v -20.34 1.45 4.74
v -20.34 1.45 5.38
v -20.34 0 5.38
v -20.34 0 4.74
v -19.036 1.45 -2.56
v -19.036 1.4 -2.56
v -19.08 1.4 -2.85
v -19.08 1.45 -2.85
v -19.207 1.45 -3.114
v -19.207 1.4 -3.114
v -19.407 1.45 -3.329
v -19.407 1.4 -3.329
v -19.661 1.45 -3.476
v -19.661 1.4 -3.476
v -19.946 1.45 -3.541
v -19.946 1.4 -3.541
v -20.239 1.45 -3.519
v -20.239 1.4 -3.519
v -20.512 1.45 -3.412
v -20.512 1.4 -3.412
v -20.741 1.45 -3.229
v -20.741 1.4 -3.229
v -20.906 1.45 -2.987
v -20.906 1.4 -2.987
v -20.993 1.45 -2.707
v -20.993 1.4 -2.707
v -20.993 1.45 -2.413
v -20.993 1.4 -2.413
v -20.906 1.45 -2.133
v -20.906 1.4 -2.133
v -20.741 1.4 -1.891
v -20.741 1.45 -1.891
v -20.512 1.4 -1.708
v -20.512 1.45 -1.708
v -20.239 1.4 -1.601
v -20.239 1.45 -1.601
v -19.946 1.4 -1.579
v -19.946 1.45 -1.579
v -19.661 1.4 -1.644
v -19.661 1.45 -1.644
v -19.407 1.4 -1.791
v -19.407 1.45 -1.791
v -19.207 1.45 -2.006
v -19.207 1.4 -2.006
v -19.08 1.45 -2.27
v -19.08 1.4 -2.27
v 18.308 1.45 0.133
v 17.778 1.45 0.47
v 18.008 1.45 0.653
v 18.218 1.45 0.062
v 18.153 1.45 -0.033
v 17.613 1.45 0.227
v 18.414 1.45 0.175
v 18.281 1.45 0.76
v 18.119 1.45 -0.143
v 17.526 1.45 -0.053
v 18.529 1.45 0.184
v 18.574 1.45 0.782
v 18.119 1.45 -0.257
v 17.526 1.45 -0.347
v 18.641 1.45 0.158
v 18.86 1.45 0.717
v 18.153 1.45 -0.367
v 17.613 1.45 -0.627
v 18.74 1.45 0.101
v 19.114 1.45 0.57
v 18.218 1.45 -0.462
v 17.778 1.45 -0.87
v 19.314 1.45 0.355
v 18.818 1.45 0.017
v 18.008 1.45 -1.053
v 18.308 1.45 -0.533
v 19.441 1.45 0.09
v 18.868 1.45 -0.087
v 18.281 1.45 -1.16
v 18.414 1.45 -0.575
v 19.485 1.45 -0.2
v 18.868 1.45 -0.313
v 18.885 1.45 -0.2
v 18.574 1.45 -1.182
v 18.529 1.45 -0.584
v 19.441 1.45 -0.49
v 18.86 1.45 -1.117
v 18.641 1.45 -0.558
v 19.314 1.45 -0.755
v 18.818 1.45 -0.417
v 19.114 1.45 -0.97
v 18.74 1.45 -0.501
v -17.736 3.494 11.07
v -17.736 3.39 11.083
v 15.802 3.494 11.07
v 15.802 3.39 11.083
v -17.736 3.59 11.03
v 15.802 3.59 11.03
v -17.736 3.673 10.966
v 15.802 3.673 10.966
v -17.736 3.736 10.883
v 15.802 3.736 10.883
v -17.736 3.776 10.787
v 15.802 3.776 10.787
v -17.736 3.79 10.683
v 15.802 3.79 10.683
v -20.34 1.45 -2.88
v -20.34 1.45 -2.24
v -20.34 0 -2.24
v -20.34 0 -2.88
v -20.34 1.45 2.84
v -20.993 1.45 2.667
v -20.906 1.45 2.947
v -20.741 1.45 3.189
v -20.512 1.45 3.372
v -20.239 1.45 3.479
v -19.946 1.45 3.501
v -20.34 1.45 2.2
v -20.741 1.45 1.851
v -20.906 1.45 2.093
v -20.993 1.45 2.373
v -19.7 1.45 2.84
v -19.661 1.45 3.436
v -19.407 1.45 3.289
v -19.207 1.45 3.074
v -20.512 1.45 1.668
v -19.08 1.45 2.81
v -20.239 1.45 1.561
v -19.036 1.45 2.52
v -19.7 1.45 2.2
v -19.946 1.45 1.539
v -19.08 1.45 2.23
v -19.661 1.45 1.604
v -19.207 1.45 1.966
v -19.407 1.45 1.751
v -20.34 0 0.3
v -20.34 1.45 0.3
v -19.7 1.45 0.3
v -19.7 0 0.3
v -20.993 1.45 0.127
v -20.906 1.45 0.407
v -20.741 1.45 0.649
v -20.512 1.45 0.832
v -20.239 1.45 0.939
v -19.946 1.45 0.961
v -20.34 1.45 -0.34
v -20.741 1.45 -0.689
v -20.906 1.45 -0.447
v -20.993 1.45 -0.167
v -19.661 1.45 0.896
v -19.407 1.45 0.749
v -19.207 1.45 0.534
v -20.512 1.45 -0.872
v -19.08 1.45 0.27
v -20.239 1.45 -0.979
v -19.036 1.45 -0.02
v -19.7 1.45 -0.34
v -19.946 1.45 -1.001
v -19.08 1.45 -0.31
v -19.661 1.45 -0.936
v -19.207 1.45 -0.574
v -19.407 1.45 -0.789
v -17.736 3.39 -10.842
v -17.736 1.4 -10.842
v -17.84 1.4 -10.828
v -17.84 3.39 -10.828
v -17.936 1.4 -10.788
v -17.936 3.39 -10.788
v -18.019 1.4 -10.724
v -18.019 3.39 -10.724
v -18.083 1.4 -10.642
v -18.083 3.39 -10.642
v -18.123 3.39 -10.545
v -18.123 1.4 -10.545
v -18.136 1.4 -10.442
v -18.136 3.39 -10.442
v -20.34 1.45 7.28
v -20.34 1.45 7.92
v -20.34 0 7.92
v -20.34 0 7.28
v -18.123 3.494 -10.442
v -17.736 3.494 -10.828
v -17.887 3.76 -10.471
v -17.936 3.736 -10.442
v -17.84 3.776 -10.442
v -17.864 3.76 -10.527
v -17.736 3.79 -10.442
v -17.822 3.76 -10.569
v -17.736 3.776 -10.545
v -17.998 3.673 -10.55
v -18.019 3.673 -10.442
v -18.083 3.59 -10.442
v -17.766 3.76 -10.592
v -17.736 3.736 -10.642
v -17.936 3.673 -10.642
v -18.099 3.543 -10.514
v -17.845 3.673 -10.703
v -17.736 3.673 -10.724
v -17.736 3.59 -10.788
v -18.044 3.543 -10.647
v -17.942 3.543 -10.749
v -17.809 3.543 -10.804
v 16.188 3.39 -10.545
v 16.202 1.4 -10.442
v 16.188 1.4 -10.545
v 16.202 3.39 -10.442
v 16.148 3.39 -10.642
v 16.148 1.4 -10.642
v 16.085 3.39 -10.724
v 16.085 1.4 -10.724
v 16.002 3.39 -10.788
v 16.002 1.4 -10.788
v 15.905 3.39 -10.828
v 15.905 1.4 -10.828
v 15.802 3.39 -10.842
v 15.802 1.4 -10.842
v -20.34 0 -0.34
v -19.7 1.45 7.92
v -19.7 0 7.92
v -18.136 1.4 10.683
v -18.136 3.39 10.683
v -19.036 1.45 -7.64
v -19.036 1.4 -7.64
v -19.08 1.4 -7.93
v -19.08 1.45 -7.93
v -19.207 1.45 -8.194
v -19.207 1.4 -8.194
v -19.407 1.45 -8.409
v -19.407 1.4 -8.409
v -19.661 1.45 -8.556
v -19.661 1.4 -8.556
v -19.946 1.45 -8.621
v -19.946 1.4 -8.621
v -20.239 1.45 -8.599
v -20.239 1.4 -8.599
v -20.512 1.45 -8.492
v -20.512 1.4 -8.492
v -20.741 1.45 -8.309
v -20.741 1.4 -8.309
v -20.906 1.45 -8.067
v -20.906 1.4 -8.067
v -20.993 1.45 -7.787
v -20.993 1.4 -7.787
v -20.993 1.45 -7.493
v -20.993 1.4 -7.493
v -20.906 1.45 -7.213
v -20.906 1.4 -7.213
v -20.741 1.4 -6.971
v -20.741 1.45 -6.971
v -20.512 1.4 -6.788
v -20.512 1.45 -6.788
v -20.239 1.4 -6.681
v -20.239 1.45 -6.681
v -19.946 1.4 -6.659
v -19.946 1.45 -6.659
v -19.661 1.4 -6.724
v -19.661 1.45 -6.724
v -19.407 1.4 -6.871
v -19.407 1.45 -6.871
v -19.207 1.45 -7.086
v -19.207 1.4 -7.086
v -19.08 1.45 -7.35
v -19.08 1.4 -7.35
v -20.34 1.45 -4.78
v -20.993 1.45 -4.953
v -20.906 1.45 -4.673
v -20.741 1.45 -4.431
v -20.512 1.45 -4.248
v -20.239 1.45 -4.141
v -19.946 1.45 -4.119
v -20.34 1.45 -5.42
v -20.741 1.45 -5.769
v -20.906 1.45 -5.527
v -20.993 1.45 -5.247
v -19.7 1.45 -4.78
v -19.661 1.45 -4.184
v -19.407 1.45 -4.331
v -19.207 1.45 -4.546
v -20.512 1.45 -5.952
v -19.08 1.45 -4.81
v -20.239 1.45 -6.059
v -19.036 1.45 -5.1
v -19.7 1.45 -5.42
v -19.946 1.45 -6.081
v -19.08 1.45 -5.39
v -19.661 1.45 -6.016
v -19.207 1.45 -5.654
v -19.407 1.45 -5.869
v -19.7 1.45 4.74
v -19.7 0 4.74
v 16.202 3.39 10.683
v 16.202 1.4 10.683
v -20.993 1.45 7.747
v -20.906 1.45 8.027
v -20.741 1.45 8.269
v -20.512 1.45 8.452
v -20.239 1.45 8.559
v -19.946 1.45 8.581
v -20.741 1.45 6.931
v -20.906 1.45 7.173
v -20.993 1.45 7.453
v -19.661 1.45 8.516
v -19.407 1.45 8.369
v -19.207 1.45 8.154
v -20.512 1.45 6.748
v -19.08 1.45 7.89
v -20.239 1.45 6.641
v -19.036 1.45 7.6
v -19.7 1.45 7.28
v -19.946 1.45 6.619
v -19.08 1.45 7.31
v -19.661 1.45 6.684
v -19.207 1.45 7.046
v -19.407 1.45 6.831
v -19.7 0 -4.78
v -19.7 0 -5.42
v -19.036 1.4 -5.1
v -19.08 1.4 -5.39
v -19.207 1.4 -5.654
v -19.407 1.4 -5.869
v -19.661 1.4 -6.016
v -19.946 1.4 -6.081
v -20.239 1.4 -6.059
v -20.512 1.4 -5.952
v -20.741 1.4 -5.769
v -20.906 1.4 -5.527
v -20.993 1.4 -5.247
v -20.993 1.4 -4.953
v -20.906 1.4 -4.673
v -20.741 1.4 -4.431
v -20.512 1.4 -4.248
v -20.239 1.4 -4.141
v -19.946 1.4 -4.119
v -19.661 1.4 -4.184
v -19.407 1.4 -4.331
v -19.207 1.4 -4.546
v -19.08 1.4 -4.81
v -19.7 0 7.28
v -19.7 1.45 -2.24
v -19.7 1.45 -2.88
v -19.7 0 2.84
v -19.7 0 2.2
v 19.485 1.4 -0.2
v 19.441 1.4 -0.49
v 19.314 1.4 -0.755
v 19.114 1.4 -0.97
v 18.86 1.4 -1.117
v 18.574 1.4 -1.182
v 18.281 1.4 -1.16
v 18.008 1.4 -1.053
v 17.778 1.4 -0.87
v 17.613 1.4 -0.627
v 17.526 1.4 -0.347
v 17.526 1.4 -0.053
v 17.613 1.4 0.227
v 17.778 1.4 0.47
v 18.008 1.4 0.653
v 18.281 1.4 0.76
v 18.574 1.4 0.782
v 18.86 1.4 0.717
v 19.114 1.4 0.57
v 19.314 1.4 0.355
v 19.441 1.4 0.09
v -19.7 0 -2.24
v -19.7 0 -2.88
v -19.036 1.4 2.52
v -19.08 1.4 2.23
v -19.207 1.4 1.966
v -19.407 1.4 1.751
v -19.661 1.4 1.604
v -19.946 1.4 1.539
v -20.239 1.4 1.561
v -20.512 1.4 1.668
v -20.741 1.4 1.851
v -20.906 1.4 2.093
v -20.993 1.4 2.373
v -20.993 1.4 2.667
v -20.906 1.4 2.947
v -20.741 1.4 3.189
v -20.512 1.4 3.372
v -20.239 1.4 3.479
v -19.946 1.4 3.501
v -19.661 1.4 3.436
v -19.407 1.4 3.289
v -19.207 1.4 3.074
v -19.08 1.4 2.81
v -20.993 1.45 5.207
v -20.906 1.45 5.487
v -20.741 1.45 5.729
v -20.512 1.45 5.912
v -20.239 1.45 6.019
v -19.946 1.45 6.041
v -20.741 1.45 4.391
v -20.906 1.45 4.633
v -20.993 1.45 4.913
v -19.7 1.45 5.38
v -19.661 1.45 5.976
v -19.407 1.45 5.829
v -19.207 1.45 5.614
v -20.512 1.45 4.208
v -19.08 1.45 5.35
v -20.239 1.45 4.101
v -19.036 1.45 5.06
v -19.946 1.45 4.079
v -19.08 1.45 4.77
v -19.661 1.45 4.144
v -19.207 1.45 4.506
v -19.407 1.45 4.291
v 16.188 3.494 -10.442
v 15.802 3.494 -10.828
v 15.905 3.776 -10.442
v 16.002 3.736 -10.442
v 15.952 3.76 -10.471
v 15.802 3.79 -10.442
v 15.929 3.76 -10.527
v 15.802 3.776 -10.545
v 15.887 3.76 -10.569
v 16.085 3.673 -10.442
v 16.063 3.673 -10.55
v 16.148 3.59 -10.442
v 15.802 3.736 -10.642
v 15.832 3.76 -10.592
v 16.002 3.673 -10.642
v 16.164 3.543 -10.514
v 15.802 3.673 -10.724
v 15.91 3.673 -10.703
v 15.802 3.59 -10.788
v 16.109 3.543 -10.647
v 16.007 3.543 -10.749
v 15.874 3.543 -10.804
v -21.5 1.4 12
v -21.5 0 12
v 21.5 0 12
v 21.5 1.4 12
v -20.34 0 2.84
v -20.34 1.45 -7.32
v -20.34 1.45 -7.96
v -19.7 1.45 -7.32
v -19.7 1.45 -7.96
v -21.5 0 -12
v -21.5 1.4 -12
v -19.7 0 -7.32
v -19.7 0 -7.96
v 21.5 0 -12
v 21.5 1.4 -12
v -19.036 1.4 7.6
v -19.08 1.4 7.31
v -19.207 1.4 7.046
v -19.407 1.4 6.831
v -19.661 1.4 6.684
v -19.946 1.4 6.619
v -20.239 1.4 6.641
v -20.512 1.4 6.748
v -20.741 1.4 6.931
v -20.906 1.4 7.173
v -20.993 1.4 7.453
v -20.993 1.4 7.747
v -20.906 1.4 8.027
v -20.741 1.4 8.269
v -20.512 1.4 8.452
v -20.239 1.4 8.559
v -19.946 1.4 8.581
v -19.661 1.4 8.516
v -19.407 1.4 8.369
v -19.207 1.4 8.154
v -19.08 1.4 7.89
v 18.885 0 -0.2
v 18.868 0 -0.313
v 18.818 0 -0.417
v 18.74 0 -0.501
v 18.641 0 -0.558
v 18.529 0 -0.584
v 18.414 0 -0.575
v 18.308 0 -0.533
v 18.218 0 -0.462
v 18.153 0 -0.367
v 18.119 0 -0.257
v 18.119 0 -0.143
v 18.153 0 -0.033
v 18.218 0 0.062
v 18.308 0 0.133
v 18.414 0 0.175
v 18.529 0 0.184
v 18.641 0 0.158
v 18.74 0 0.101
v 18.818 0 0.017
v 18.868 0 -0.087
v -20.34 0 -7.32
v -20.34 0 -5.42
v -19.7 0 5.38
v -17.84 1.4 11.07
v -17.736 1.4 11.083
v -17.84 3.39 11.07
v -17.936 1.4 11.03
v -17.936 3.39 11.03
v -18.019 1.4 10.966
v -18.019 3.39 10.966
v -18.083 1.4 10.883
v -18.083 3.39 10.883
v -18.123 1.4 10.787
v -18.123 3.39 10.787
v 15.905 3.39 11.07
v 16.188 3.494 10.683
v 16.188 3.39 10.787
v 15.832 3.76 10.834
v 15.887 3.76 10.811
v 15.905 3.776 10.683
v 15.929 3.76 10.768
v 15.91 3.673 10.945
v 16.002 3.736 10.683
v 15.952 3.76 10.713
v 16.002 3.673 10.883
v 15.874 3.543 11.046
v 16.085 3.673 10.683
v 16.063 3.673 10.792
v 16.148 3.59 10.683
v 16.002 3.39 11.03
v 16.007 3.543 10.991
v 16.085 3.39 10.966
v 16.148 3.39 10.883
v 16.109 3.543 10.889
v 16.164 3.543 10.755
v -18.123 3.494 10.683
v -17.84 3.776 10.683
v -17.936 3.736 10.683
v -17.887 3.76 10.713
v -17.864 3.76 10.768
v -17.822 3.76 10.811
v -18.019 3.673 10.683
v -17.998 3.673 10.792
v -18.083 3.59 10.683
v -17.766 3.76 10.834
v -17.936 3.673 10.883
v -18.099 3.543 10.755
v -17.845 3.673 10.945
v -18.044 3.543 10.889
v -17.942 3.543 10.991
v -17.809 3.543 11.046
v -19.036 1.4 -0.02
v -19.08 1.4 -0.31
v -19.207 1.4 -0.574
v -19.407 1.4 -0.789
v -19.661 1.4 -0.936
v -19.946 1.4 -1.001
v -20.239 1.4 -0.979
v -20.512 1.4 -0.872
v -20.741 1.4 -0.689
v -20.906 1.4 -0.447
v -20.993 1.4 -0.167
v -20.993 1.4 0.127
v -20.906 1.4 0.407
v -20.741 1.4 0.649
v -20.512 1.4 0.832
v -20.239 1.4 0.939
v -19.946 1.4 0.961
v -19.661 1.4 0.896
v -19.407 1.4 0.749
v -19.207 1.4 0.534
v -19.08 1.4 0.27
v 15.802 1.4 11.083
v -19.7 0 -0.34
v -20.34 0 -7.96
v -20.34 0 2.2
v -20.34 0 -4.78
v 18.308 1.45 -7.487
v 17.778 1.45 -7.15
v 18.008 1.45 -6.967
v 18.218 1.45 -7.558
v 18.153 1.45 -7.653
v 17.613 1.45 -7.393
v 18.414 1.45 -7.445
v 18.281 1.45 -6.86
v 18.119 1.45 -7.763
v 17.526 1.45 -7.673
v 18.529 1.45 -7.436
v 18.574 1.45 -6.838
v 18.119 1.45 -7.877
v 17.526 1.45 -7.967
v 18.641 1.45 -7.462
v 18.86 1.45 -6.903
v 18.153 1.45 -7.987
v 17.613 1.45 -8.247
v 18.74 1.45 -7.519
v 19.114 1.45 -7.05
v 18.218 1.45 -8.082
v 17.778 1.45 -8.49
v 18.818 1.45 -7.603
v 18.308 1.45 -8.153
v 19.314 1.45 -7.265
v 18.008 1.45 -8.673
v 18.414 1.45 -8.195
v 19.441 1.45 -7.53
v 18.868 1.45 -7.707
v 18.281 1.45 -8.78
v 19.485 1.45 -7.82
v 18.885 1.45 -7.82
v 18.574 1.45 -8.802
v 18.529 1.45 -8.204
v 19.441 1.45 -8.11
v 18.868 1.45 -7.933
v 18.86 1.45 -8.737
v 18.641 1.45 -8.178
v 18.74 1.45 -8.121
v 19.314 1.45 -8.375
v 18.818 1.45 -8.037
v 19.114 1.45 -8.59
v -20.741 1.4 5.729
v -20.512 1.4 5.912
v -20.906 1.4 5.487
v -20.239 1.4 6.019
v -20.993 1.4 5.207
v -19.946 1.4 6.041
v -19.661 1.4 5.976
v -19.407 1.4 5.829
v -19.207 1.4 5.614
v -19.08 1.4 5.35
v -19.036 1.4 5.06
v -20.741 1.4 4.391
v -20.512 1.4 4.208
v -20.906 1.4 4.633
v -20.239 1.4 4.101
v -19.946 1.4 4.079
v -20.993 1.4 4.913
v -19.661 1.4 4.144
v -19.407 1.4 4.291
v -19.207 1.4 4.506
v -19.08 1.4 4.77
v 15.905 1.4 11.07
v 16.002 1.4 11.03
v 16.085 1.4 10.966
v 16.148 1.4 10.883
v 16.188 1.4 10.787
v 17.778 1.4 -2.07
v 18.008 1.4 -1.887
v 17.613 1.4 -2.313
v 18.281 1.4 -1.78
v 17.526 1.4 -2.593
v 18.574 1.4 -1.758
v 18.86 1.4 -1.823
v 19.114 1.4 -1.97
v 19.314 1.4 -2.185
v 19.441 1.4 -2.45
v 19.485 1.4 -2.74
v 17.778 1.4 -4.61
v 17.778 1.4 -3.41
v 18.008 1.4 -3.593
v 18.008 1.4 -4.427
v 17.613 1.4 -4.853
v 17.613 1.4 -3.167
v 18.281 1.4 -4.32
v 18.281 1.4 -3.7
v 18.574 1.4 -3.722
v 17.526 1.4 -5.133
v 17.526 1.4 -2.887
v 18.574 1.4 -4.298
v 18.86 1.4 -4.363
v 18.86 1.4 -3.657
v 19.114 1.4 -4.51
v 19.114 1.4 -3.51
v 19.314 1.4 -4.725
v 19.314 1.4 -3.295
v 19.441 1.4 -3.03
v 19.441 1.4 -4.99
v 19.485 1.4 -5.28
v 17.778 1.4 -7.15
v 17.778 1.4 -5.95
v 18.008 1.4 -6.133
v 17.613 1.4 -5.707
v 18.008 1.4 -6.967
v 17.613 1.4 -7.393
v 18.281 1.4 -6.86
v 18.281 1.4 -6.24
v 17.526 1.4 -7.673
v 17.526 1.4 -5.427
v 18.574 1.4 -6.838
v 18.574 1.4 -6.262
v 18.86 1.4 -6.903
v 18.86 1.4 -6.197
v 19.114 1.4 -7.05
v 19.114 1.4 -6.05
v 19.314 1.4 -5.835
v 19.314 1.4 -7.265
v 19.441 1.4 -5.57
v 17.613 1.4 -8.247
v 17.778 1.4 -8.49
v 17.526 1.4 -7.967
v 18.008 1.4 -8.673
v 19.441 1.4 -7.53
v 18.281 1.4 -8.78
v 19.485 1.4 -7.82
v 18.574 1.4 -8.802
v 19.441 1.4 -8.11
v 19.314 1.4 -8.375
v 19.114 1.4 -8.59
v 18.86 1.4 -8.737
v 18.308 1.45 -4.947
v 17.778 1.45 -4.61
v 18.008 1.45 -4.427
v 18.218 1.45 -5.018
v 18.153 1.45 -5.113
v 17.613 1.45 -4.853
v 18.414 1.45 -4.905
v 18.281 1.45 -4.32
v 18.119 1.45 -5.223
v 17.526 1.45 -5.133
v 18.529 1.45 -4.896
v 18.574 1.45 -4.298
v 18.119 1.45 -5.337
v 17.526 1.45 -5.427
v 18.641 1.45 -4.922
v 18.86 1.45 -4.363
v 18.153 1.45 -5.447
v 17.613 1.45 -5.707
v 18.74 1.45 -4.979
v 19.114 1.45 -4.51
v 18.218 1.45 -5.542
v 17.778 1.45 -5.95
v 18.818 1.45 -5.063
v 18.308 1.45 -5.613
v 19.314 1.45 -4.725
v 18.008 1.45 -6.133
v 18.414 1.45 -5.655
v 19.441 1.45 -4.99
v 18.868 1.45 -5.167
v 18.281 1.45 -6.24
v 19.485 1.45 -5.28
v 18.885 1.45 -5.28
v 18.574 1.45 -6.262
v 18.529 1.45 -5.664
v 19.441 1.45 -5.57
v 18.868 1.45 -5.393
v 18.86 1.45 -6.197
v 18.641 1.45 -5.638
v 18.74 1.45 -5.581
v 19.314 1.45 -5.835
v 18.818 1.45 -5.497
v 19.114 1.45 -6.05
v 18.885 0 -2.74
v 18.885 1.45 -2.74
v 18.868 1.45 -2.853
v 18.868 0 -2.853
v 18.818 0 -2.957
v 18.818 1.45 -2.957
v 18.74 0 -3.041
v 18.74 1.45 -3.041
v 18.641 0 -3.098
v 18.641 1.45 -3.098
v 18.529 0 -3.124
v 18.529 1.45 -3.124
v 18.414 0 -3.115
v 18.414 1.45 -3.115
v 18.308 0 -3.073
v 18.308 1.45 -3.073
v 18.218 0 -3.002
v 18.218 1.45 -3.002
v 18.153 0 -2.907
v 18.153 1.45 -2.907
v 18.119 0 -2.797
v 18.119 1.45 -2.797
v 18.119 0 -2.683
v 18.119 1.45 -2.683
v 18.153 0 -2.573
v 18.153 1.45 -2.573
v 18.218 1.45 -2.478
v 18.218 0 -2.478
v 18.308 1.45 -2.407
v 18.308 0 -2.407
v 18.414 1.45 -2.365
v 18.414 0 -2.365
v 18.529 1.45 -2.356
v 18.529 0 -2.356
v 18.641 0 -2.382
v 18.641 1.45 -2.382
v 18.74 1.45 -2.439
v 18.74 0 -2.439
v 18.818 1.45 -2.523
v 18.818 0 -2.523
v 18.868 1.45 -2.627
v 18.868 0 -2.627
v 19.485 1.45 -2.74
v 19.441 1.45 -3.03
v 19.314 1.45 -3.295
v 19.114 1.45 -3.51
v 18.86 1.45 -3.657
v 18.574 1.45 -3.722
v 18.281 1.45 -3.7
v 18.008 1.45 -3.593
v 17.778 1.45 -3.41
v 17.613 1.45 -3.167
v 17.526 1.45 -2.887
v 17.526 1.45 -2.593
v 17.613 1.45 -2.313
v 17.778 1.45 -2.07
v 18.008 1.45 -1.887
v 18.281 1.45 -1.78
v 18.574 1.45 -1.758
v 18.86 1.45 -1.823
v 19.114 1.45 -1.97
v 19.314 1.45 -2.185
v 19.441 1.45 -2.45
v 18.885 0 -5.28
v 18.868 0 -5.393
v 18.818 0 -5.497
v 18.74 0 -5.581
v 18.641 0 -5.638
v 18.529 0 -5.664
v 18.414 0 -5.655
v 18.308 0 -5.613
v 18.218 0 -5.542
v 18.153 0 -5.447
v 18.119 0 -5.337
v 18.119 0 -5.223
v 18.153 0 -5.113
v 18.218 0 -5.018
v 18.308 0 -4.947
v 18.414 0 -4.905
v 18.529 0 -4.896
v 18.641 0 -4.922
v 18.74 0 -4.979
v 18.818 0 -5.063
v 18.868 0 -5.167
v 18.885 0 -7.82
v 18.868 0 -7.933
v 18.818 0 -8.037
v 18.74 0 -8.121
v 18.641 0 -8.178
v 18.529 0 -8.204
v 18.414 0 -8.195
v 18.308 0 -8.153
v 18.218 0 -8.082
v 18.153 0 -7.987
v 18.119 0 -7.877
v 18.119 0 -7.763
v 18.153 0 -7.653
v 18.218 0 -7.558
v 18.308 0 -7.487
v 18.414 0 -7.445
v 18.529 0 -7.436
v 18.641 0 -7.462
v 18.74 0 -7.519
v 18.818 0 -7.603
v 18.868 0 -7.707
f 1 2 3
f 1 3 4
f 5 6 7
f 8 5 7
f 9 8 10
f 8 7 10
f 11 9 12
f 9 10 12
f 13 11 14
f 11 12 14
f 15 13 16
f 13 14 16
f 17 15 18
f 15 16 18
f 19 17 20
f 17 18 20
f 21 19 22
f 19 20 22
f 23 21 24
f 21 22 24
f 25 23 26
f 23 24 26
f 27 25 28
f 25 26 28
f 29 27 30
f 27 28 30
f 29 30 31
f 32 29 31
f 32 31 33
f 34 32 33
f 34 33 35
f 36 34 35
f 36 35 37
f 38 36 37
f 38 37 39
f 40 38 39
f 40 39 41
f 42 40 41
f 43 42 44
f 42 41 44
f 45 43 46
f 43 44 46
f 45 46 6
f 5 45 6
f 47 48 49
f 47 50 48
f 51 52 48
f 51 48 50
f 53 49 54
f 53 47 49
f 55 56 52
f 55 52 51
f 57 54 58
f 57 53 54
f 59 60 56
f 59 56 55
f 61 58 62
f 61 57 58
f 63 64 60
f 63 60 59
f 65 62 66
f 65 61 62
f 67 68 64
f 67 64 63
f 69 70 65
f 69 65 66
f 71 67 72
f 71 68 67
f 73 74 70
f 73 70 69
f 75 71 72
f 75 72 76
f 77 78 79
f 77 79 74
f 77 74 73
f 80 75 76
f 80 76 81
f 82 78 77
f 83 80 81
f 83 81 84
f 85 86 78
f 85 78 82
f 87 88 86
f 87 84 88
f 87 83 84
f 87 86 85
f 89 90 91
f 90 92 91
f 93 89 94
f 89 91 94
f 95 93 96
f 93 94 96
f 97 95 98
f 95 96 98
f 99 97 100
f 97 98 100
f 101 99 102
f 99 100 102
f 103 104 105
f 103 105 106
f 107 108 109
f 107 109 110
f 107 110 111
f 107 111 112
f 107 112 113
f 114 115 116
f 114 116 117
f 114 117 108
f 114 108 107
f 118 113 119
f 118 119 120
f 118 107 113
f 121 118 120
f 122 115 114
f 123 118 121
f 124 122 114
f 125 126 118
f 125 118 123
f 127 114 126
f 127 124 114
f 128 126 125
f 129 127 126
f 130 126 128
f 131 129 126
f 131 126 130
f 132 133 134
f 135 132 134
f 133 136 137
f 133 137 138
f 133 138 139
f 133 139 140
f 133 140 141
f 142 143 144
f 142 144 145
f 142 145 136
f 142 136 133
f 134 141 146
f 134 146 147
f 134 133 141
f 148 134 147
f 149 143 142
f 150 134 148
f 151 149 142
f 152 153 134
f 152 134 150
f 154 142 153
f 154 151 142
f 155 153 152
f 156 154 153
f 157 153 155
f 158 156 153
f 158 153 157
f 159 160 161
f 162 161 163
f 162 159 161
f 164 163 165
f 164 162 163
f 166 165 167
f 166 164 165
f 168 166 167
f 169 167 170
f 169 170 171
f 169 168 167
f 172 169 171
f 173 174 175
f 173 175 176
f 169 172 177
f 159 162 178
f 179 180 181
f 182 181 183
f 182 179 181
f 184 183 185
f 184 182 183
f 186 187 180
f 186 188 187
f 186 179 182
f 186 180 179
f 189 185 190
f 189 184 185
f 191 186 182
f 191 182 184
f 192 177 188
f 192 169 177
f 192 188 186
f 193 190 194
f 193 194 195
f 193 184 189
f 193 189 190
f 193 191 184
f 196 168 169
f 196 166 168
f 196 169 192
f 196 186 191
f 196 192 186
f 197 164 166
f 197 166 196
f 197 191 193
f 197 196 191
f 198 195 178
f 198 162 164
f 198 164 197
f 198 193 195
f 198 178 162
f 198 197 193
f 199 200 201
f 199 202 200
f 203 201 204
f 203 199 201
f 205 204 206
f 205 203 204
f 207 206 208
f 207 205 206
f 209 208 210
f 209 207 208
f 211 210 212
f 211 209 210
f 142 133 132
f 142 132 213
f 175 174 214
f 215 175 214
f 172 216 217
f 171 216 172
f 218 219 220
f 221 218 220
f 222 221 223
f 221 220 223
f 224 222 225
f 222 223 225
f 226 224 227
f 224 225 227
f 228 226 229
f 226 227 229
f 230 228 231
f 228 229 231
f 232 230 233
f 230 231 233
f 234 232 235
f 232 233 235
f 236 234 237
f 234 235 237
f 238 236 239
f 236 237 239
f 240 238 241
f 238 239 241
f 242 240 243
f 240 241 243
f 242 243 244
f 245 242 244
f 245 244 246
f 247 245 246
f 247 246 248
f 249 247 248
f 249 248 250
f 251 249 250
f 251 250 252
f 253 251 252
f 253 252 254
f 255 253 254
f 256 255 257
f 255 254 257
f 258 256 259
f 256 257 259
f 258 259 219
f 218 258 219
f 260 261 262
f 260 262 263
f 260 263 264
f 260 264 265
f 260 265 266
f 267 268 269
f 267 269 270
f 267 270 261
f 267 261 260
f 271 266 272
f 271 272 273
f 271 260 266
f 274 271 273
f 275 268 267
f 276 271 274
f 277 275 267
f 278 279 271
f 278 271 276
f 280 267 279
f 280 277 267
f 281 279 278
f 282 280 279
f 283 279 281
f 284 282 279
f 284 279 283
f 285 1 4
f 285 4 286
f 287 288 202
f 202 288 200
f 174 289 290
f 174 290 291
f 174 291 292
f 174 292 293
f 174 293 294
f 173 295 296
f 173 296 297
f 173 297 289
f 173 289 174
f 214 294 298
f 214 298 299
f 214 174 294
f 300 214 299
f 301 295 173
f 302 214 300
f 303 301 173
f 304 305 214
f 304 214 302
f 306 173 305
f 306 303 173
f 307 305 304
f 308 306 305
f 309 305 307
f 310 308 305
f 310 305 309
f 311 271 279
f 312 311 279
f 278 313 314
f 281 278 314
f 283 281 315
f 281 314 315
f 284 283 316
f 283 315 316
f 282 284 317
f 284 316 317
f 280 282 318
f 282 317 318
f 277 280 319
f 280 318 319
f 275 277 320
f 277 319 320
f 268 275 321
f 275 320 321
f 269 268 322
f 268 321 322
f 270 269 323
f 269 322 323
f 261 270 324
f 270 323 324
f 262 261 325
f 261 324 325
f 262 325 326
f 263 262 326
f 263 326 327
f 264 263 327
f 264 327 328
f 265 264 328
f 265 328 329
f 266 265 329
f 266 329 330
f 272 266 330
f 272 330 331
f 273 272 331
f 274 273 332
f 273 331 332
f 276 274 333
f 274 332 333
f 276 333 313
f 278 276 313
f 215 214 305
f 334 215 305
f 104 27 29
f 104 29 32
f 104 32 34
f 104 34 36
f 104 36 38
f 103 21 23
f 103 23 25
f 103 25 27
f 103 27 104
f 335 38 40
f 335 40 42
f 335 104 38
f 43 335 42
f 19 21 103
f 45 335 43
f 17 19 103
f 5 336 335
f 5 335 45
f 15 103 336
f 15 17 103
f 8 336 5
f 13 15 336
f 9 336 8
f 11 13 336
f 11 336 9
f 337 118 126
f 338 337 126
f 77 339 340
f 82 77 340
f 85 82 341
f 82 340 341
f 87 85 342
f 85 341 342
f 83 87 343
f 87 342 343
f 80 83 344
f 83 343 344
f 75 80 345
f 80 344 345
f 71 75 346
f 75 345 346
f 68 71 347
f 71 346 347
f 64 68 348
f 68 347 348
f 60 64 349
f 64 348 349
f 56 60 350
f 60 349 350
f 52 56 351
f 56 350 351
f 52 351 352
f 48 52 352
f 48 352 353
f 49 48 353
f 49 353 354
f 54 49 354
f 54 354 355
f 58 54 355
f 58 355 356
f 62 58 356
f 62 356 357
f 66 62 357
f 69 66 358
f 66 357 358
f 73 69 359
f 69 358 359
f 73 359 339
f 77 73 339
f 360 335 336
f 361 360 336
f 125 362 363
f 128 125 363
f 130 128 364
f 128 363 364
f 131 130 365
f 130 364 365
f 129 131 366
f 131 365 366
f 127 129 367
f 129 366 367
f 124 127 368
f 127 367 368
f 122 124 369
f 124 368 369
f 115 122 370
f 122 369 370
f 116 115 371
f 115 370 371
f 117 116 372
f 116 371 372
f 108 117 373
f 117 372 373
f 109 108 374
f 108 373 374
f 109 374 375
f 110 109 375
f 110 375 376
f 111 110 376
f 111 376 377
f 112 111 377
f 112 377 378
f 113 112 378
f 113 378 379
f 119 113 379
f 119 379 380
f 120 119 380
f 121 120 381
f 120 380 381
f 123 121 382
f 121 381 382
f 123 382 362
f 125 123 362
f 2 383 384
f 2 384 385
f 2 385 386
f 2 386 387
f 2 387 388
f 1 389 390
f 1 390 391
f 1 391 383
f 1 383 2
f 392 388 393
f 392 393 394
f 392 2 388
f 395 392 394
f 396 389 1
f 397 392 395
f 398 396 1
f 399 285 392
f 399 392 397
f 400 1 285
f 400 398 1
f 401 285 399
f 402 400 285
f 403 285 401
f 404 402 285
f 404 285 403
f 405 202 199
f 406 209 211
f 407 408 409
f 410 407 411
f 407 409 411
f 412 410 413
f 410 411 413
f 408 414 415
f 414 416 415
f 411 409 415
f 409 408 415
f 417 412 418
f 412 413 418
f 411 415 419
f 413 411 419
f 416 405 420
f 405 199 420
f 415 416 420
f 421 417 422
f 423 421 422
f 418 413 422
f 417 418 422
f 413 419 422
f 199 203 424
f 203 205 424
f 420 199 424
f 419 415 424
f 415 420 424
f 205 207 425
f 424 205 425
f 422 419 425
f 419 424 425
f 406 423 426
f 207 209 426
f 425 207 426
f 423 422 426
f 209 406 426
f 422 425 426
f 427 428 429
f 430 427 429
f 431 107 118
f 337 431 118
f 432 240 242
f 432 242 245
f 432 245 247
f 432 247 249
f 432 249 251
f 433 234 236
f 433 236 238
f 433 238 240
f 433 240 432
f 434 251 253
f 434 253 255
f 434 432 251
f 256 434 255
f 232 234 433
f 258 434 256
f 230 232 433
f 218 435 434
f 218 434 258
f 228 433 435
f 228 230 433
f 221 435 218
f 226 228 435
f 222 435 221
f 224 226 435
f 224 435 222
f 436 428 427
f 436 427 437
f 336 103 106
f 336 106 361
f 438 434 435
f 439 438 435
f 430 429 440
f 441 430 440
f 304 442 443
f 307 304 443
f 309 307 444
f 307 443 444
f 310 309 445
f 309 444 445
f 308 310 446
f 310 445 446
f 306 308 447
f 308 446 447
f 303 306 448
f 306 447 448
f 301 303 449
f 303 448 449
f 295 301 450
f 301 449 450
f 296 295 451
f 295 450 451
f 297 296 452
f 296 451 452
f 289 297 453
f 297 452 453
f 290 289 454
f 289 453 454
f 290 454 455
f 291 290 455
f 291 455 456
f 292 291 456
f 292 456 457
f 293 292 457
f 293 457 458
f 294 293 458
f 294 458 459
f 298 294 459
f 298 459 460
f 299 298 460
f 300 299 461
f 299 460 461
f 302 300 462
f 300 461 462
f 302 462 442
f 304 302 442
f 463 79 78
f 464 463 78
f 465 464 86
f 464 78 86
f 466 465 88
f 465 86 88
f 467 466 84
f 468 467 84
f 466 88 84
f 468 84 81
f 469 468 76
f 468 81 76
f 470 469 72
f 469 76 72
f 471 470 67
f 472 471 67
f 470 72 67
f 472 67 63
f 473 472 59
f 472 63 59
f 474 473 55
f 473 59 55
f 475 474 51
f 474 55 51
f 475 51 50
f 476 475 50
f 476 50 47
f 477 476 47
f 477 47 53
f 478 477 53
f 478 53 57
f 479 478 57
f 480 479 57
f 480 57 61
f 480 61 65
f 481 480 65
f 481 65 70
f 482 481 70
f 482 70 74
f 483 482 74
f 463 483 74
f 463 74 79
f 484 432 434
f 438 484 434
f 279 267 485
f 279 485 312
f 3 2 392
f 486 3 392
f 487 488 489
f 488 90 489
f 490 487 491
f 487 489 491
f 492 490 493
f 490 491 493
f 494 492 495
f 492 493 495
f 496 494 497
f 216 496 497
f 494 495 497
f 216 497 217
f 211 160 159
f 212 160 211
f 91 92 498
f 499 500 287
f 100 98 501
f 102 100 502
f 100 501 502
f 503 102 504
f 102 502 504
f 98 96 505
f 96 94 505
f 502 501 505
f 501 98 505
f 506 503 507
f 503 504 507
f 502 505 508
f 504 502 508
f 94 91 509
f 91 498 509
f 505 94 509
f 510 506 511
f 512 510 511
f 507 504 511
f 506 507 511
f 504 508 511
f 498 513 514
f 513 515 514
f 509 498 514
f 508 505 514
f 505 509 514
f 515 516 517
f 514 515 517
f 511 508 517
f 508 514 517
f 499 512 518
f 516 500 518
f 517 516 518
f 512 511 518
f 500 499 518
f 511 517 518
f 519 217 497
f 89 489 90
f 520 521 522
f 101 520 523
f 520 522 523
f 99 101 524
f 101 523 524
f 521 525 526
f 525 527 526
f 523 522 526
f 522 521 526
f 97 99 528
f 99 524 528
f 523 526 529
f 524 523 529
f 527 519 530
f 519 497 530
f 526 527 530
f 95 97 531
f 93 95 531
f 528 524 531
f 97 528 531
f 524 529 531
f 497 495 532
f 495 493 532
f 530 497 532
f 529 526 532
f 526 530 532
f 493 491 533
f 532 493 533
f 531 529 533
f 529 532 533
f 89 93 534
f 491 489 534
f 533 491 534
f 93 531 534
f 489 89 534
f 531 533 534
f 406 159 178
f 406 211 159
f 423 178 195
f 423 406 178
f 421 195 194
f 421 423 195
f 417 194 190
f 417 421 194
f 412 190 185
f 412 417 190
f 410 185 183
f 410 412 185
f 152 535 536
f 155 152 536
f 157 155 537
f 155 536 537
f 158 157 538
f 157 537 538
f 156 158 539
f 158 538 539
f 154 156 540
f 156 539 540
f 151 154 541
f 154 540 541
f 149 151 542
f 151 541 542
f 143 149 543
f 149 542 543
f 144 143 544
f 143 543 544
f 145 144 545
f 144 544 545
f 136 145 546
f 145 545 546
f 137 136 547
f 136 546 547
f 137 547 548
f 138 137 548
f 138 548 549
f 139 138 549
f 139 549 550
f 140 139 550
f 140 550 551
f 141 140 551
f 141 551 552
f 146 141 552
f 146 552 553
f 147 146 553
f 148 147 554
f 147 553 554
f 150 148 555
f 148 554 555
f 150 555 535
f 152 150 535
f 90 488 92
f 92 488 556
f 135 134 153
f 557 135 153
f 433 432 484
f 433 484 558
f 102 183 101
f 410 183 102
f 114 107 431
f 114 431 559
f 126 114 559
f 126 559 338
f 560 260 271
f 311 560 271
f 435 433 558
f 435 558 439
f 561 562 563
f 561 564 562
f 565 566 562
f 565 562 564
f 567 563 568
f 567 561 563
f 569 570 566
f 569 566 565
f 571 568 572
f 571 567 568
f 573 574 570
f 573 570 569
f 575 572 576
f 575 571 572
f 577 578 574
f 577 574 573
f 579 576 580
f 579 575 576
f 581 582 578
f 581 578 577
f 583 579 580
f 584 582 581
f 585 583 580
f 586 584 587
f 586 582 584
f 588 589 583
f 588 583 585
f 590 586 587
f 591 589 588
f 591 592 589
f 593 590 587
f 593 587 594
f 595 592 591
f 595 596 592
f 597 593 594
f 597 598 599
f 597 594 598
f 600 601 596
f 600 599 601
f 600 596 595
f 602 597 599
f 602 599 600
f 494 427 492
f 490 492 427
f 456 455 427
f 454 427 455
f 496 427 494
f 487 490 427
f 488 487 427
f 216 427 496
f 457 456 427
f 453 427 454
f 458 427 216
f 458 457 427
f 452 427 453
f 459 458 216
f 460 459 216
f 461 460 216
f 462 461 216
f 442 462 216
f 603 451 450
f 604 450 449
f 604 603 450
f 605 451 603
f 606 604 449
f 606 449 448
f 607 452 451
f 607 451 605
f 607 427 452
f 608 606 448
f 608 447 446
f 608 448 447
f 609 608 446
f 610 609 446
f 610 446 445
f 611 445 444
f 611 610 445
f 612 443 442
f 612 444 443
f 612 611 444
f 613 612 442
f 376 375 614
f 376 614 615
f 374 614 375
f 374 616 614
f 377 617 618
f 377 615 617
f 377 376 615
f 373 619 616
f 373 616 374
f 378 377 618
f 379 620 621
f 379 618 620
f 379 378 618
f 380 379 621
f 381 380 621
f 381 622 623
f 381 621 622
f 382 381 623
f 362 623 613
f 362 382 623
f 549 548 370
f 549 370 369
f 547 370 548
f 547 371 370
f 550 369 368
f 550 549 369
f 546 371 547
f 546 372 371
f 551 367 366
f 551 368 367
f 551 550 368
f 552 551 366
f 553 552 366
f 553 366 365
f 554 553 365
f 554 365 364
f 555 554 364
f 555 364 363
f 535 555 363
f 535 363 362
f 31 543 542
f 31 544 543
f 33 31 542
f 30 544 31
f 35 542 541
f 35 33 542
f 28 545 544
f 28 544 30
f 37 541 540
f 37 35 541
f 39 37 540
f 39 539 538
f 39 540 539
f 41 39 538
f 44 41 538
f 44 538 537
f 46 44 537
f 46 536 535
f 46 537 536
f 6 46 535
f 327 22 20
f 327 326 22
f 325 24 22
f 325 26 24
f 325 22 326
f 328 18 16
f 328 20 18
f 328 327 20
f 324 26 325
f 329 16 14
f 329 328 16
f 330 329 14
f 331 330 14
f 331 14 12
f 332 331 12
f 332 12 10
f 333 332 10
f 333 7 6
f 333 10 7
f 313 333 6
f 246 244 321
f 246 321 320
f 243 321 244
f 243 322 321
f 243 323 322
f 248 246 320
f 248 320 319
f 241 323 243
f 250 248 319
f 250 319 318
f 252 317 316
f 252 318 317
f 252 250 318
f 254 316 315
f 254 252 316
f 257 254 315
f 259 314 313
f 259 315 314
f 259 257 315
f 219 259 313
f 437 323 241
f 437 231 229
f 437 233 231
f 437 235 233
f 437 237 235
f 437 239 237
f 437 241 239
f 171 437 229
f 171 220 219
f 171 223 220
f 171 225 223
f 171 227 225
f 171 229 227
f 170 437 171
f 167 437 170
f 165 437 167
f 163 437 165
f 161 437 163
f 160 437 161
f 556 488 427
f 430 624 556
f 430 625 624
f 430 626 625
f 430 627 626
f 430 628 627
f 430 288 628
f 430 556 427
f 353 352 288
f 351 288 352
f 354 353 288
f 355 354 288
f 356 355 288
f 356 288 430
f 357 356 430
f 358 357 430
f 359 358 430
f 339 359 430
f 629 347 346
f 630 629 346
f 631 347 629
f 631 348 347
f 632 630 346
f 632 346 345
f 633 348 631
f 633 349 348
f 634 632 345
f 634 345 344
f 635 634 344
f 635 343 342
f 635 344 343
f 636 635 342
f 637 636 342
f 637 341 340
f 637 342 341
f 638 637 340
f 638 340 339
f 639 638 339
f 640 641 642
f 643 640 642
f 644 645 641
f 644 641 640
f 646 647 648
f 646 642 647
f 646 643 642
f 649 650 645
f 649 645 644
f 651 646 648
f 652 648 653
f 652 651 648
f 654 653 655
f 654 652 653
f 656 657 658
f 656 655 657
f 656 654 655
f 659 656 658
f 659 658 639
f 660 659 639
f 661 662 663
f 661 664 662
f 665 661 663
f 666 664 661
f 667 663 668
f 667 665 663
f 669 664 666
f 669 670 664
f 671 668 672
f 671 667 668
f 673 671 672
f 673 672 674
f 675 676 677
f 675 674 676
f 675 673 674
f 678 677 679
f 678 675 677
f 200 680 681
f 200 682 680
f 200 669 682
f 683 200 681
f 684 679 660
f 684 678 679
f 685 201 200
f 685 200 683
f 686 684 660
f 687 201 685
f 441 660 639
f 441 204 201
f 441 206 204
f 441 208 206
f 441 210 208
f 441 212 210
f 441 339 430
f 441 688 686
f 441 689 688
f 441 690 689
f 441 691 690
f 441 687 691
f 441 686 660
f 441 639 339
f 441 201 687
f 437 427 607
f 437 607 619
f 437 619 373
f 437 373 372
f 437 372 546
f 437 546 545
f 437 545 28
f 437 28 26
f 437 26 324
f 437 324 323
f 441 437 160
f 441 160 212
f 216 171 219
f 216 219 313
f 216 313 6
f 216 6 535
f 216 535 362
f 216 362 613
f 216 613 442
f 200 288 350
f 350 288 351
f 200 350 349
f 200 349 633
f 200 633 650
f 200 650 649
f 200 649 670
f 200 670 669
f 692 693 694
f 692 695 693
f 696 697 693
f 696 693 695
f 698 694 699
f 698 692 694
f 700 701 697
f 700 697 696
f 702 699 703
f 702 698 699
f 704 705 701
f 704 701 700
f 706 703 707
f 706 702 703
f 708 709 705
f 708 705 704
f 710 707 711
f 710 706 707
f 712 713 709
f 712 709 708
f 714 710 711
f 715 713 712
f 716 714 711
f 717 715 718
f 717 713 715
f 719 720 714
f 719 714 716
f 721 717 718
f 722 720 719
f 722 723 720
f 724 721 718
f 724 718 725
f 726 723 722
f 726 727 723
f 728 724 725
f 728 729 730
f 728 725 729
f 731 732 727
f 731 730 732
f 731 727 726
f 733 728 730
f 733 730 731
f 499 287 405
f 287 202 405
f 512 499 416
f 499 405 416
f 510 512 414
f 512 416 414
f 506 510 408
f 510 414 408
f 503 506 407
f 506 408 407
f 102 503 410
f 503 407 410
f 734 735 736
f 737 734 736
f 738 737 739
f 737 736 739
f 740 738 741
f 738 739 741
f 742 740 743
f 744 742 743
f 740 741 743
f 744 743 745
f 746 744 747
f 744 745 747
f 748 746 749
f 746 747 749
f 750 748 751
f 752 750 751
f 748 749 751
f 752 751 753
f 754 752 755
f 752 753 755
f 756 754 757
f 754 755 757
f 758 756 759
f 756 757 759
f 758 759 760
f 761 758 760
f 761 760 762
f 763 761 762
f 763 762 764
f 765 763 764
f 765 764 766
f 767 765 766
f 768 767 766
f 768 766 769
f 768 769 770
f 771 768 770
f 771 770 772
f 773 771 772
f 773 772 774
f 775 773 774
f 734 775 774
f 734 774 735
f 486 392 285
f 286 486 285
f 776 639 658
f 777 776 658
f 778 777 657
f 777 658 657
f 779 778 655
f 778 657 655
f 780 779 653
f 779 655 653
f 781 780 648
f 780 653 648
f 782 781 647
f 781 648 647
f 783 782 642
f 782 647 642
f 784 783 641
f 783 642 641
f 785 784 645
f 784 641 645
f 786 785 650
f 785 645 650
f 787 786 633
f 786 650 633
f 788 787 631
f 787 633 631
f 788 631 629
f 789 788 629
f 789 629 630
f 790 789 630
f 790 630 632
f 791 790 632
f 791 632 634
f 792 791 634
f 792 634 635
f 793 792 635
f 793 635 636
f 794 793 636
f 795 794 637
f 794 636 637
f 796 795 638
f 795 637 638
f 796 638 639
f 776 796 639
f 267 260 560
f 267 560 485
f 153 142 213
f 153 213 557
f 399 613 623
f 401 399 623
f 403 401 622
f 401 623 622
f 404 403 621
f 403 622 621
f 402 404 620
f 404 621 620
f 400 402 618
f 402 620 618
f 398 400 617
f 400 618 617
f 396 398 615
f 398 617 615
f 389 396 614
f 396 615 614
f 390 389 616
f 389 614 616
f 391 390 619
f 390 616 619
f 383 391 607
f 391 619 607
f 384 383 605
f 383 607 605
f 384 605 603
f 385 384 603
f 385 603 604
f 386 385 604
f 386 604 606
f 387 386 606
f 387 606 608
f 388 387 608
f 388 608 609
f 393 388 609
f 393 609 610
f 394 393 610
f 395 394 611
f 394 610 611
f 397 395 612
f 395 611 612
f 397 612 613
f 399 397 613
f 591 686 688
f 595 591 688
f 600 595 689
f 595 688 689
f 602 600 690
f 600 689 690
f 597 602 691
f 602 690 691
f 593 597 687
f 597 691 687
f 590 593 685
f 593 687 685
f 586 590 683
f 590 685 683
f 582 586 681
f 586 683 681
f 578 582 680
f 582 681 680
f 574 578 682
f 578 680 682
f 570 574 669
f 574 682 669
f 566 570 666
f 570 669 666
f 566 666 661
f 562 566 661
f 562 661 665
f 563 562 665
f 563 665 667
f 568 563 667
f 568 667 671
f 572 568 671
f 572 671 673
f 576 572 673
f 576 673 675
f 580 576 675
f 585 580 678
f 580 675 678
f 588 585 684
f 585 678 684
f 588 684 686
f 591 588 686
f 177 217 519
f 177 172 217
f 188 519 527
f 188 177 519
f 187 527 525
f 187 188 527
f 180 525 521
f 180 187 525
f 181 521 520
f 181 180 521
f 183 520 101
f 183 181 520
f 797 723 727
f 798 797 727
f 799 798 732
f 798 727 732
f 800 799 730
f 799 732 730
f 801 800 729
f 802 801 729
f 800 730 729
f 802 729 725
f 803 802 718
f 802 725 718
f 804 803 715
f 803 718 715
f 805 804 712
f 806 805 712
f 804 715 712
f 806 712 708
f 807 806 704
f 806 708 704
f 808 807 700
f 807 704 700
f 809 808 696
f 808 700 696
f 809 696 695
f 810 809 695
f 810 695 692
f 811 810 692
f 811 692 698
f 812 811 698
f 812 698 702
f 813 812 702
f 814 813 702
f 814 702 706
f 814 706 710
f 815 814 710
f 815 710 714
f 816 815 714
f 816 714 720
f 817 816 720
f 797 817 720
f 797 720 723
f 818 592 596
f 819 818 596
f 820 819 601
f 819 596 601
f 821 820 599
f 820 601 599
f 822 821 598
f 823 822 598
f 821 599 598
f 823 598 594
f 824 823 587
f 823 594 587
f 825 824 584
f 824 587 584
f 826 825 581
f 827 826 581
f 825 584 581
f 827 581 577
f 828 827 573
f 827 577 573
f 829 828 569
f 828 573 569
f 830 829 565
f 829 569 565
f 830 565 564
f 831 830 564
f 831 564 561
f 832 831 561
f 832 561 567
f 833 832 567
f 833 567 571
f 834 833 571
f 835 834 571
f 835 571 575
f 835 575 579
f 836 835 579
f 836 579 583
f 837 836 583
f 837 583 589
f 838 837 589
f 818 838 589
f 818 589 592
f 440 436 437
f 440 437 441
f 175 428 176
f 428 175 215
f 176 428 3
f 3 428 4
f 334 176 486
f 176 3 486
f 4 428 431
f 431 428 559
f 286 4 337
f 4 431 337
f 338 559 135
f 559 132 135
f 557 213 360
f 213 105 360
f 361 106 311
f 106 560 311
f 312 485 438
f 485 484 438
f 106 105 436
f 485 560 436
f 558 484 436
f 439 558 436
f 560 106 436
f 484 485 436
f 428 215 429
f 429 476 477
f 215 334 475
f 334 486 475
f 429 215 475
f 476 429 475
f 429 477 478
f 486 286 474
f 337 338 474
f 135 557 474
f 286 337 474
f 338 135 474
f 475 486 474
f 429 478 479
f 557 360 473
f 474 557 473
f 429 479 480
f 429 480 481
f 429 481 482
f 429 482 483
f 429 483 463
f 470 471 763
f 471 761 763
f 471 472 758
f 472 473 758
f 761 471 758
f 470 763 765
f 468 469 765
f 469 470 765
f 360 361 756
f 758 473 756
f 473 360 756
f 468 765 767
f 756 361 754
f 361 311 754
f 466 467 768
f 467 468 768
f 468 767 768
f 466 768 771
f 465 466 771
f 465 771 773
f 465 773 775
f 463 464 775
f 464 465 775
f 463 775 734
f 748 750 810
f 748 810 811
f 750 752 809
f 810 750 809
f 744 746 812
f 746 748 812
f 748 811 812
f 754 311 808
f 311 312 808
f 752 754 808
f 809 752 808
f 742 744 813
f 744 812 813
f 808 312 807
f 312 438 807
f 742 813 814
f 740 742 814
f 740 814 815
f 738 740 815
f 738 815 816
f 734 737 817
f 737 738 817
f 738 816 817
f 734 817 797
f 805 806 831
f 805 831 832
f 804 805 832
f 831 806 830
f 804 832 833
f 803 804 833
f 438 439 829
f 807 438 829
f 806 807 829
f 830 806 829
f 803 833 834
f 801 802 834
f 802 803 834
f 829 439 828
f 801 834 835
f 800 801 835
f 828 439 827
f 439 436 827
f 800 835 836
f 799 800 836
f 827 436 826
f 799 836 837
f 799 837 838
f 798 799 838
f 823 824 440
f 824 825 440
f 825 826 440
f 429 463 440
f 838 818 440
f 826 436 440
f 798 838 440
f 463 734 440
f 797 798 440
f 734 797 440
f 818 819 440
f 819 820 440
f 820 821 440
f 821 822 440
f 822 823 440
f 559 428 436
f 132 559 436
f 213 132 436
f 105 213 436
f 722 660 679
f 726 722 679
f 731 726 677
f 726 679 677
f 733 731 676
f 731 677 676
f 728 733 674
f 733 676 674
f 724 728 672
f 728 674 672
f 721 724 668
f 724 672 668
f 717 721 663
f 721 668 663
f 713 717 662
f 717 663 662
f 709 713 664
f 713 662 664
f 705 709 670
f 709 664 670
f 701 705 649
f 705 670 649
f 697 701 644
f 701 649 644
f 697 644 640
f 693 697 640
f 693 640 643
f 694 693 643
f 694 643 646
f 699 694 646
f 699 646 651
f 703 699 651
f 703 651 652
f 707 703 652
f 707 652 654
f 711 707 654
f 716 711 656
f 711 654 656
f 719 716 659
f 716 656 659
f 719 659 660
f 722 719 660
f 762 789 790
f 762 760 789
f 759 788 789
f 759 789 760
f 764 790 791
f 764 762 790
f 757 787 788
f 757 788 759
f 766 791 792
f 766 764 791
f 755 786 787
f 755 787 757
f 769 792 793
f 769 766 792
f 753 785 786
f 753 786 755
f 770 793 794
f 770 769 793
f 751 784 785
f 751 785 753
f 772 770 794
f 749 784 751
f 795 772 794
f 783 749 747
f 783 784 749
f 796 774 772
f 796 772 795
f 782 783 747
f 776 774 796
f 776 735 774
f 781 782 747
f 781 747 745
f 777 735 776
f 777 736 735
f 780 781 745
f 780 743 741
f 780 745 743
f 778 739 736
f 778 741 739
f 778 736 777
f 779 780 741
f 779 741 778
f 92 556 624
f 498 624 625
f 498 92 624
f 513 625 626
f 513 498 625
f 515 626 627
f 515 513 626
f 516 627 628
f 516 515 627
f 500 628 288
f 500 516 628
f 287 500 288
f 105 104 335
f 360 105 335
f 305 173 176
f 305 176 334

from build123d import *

# Parameters (mm, degrees)
CROQUIS1_W              = 43
CROQUIS1_H              = 24
SALIENTE_EXTRUIR1_DEPTH = 1.4
CROQUIS2_R              = 0.983927781
CROQUIS2_R_2            = 0.985
SALIENTE_EXTRUIR2_DEPTH = 0.05
CROQUIS3_W              = 0.64
CROQUIS3_H              = 0.64
CORTAR_EXTRUIR1_DEPTH   = 1.81
CROQUIS4_R              = 0.385
CORTAR_EXTRUIR2_DEPTH   = 1.81
CROQUIS5_W              = 34.338370929
CROQUIS5_H              = 21.924969232
SALIENTE_EXTRUIR3_DEPTH = 2.39
REDONDEO1_R             = 0.4


with BuildPart() as part:
    # Croquis1 → Saliente-Extruir1 (new body)
    with BuildSketch(Plane(origin=(0, 0, 0), x_dir=(1, 0, 0), z_dir=(0, 1, 0))):
        Rectangle(CROQUIS1_W, CROQUIS1_H)
    extrude(amount=SALIENTE_EXTRUIR1_DEPTH)

    # Croquis2 → Saliente-Extruir2 (add)
    with BuildSketch(Plane(origin=(0, 1.4, 0), x_dir=(1, 0, 0), z_dir=(0, 1, 0))):
        with Locations((-20.02, 7.64)):
            Circle(CROQUIS2_R)
        with Locations((-20.02, 5.1)):
            Circle(CROQUIS2_R)
        with Locations((-20.02, 2.56)):
            Circle(CROQUIS2_R)
        with Locations((-20.02, 0.02)):
            Circle(CROQUIS2_R)
        with Locations((-20.02, -2.52)):
            Circle(CROQUIS2_R)
        with Locations((-20.02, -5.06)):
            Circle(CROQUIS2_R)
        with Locations((-20.02, -7.6)):
            Circle(CROQUIS2_R)
        with Locations((18.5, 7.82)):
            Circle(CROQUIS2_R_2)
        with Locations((18.5, 5.28)):
            Circle(CROQUIS2_R_2)
        with Locations((18.5, 2.74)):
            Circle(CROQUIS2_R_2)
        with Locations((18.5, 0.2)):
            Circle(CROQUIS2_R_2)
    extrude(amount=SALIENTE_EXTRUIR2_DEPTH)

    # Croquis3 → Cortar-Extruir1 (cut)
    with BuildSketch(Plane(origin=(0, 1.45, 0), x_dir=(1, 0, 0), z_dir=(0, 1, 0))):
        with Locations((-20.02, 5.1)):
            Rectangle(CROQUIS3_W, CROQUIS3_H)
        with Locations((-20.02, 7.64)):
            Rectangle(CROQUIS3_W, CROQUIS3_H)
        with Locations((-20.02, 2.56)):
            Rectangle(CROQUIS3_W, CROQUIS3_H)
        with Locations((-20.02, 0.02)):
            Rectangle(CROQUIS3_W, CROQUIS3_H)
        with Locations((-20.02, -2.52)):
            Rectangle(CROQUIS3_W, CROQUIS3_H)
        with Locations((-20.02, -5.06)):
            Rectangle(CROQUIS3_W, CROQUIS3_H)
        with Locations((-20.02, -7.6)):
            Rectangle(CROQUIS3_W, CROQUIS3_H)
    extrude(amount=-CORTAR_EXTRUIR1_DEPTH, mode=Mode.SUBTRACT)

    # Croquis4 → Cortar-Extruir2 (cut)
    with BuildSketch(Plane(origin=(0, 1.45, 0), x_dir=(1, 0, 0), z_dir=(0, 1, 0))):
        with Locations((18.5, 5.28)):
            Circle(CROQUIS4_R)
        with Locations((18.5, 7.82)):
            Circle(CROQUIS4_R)
        with Locations((18.5, 2.74)):
            Circle(CROQUIS4_R)
        with Locations((18.5, 0.2)):
            Circle(CROQUIS4_R)
    extrude(amount=-CORTAR_EXTRUIR2_DEPTH, mode=Mode.SUBTRACT)

    # Croquis5 → Saliente-Extruir3 (add)
    with BuildSketch(Plane(origin=(0, 1.4, 0), x_dir=(1, 0, 0), z_dir=(0, 1, 0))):
        with Locations((-0.967278054, -0.120909757)):
            Rectangle(CROQUIS5_W, CROQUIS5_H)
    extrude(amount=SALIENTE_EXTRUIR3_DEPTH)

    # Redondeo1
    redondeo1_edges = [part.edges().sort_by_distance(p)[0] for p in [
        (-18.136463519, 2.595, -10.841574859),
        (-18.136463519, 2.595, 11.083394373),
        (16.20190741, 2.595, 11.083394373),
        (16.20190741, 2.595, -10.841574859),
        (-18.136463519, 3.79, 0.120909757),
        (-0.967278054, 3.79, 11.083394373),
        (16.20190741, 3.79, 0.120909757),
        (-0.967278054, 3.79, -10.841574859),
    ]]
    fillet(redondeo1_edges, radius=REDONDEO1_R)


solid = part.part
